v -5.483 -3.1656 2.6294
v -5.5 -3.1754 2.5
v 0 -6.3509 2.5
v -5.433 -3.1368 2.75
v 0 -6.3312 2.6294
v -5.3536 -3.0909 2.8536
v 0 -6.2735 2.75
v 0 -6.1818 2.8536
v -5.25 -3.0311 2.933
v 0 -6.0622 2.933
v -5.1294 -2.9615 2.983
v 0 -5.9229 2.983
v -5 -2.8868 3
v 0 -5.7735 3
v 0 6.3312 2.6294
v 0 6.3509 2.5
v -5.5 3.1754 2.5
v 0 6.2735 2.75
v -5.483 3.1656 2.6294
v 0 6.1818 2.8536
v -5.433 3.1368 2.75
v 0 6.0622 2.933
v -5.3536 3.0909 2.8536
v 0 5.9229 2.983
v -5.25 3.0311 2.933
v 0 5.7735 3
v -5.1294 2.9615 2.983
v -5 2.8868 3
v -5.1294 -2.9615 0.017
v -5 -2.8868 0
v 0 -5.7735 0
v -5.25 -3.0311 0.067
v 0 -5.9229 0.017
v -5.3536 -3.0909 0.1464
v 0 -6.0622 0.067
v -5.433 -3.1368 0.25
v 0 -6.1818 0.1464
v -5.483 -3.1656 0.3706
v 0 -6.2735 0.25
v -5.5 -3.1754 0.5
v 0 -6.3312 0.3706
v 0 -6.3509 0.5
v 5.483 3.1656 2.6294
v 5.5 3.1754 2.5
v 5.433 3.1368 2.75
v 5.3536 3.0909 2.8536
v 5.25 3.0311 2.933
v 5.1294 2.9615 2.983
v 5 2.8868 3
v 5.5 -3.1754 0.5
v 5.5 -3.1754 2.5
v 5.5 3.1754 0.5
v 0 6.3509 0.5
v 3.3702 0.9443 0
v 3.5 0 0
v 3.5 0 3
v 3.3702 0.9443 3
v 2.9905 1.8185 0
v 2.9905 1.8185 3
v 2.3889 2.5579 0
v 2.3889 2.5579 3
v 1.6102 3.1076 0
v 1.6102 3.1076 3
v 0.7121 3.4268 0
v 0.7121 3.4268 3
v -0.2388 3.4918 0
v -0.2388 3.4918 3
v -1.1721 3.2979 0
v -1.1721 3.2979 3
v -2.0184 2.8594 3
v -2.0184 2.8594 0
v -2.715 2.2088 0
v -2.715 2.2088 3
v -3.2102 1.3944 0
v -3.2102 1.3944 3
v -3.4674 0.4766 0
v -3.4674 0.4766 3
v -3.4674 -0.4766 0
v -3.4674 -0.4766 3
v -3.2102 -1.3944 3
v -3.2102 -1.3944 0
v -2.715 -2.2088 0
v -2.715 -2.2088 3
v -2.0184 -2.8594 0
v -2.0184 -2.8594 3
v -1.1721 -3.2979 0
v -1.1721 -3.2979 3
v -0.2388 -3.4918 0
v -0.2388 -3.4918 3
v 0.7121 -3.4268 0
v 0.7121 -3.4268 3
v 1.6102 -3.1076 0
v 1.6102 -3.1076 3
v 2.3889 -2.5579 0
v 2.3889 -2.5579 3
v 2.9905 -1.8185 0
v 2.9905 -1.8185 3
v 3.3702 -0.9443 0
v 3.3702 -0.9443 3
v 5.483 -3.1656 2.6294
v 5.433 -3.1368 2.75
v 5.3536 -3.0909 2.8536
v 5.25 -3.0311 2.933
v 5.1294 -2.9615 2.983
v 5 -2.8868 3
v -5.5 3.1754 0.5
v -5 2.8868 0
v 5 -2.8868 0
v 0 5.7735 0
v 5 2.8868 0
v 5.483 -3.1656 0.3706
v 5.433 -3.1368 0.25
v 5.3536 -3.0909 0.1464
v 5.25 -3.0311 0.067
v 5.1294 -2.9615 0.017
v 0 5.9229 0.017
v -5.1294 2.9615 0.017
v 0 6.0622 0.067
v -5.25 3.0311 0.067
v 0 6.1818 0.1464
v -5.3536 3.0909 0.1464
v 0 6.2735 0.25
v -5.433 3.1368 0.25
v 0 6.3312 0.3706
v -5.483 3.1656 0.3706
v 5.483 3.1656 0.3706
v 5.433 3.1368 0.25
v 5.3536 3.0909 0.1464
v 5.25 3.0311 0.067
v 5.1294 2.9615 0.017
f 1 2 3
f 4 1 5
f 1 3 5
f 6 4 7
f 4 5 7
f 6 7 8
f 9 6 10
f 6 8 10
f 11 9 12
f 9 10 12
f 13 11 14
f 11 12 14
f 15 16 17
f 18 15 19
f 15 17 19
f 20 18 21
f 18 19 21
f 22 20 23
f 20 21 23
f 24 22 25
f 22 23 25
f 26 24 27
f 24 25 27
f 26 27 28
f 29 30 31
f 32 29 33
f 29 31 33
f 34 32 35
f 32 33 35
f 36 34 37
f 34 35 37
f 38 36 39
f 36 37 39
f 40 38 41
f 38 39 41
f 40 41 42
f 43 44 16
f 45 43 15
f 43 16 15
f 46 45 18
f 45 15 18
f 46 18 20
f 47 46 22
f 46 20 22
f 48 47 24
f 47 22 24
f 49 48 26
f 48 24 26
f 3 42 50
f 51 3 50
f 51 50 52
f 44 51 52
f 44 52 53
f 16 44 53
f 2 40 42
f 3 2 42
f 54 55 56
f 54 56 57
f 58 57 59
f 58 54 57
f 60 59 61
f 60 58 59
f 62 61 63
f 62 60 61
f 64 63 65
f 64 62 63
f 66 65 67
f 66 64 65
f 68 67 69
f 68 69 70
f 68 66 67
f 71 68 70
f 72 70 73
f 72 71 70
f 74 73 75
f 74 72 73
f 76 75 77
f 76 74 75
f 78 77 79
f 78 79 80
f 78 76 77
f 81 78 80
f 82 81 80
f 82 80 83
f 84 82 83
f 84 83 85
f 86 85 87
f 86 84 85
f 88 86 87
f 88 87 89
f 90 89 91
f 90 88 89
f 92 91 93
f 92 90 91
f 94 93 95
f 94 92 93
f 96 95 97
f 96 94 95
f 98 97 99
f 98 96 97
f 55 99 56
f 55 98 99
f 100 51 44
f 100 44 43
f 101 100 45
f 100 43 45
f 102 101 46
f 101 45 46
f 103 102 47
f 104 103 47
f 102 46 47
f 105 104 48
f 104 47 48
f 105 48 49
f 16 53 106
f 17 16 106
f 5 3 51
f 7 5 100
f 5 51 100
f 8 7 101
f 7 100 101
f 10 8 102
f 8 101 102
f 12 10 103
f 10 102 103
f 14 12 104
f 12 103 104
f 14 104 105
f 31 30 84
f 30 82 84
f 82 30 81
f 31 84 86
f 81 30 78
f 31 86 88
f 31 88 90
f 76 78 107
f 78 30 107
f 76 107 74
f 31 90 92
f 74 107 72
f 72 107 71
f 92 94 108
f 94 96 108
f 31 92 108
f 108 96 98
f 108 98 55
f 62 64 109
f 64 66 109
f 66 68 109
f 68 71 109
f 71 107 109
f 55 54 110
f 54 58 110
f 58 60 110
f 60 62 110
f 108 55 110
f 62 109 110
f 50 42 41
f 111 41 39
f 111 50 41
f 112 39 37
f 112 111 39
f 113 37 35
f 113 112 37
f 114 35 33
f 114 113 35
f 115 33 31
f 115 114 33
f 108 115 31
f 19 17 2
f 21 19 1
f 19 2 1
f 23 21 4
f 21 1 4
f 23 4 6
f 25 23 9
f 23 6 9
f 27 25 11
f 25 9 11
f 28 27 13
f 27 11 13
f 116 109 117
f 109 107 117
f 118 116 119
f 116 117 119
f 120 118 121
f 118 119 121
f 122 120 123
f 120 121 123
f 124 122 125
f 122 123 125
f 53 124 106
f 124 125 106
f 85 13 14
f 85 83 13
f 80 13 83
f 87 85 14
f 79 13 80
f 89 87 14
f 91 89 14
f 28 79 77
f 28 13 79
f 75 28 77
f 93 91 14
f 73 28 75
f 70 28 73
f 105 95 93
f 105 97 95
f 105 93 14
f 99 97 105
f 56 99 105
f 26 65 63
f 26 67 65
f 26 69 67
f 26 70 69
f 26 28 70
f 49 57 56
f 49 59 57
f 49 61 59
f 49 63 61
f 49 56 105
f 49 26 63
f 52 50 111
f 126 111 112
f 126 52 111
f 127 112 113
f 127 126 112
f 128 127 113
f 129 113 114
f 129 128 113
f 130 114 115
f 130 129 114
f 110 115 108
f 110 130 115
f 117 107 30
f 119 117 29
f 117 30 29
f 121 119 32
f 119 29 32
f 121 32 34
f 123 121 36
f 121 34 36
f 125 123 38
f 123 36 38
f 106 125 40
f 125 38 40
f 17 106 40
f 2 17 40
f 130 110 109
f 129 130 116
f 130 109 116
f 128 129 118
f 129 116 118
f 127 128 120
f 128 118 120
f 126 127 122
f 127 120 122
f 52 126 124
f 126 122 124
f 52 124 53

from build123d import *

# Parameters (mm, degrees)
F0_R     = 3.5
F1_DEPTH = 3
F2_R     = 0.5
F3_R     = 0.5


with BuildPart() as f1:
    # F0 (on Top) → F1 (new body)
    with BuildSketch(Plane.XY):
        Polygon((5.5, -3.175426), (5.5, 3.175426), (0, 6.350853), (-5.5, 3.175426), (-5.5, -3.175426), (0, -6.350853), align=None)
        Circle(F0_R, mode=Mode.SUBTRACT)
    extrude(amount=F1_DEPTH)

    # F2
    f2_edges = [f1.edges().sort_by_distance(p)[0] for p in [
        (2.75, -4.76314, 3),
        (-2.75, -4.76314, 3),
        (-2.75, 4.76314, 3),
        (-5.5, 0, 3),
        (5.5, 0, 3),
        (2.75, 4.76314, 3),
    ]]
    fillet(f2_edges, radius=F2_R)

    # F3
    f3_edges = [f1.edges().sort_by_distance(p)[0] for p in [
        (2.75, -4.76314, 0),
        (-2.75, -4.76314, 0),
        (-2.75, 4.76314, 0),
        (-5.5, 0, 0),
        (2.75, 4.76314, 0),
        (5.5, 0, 0),
    ]]
    fillet(f3_edges, radius=F3_R)


solid = f1.part
